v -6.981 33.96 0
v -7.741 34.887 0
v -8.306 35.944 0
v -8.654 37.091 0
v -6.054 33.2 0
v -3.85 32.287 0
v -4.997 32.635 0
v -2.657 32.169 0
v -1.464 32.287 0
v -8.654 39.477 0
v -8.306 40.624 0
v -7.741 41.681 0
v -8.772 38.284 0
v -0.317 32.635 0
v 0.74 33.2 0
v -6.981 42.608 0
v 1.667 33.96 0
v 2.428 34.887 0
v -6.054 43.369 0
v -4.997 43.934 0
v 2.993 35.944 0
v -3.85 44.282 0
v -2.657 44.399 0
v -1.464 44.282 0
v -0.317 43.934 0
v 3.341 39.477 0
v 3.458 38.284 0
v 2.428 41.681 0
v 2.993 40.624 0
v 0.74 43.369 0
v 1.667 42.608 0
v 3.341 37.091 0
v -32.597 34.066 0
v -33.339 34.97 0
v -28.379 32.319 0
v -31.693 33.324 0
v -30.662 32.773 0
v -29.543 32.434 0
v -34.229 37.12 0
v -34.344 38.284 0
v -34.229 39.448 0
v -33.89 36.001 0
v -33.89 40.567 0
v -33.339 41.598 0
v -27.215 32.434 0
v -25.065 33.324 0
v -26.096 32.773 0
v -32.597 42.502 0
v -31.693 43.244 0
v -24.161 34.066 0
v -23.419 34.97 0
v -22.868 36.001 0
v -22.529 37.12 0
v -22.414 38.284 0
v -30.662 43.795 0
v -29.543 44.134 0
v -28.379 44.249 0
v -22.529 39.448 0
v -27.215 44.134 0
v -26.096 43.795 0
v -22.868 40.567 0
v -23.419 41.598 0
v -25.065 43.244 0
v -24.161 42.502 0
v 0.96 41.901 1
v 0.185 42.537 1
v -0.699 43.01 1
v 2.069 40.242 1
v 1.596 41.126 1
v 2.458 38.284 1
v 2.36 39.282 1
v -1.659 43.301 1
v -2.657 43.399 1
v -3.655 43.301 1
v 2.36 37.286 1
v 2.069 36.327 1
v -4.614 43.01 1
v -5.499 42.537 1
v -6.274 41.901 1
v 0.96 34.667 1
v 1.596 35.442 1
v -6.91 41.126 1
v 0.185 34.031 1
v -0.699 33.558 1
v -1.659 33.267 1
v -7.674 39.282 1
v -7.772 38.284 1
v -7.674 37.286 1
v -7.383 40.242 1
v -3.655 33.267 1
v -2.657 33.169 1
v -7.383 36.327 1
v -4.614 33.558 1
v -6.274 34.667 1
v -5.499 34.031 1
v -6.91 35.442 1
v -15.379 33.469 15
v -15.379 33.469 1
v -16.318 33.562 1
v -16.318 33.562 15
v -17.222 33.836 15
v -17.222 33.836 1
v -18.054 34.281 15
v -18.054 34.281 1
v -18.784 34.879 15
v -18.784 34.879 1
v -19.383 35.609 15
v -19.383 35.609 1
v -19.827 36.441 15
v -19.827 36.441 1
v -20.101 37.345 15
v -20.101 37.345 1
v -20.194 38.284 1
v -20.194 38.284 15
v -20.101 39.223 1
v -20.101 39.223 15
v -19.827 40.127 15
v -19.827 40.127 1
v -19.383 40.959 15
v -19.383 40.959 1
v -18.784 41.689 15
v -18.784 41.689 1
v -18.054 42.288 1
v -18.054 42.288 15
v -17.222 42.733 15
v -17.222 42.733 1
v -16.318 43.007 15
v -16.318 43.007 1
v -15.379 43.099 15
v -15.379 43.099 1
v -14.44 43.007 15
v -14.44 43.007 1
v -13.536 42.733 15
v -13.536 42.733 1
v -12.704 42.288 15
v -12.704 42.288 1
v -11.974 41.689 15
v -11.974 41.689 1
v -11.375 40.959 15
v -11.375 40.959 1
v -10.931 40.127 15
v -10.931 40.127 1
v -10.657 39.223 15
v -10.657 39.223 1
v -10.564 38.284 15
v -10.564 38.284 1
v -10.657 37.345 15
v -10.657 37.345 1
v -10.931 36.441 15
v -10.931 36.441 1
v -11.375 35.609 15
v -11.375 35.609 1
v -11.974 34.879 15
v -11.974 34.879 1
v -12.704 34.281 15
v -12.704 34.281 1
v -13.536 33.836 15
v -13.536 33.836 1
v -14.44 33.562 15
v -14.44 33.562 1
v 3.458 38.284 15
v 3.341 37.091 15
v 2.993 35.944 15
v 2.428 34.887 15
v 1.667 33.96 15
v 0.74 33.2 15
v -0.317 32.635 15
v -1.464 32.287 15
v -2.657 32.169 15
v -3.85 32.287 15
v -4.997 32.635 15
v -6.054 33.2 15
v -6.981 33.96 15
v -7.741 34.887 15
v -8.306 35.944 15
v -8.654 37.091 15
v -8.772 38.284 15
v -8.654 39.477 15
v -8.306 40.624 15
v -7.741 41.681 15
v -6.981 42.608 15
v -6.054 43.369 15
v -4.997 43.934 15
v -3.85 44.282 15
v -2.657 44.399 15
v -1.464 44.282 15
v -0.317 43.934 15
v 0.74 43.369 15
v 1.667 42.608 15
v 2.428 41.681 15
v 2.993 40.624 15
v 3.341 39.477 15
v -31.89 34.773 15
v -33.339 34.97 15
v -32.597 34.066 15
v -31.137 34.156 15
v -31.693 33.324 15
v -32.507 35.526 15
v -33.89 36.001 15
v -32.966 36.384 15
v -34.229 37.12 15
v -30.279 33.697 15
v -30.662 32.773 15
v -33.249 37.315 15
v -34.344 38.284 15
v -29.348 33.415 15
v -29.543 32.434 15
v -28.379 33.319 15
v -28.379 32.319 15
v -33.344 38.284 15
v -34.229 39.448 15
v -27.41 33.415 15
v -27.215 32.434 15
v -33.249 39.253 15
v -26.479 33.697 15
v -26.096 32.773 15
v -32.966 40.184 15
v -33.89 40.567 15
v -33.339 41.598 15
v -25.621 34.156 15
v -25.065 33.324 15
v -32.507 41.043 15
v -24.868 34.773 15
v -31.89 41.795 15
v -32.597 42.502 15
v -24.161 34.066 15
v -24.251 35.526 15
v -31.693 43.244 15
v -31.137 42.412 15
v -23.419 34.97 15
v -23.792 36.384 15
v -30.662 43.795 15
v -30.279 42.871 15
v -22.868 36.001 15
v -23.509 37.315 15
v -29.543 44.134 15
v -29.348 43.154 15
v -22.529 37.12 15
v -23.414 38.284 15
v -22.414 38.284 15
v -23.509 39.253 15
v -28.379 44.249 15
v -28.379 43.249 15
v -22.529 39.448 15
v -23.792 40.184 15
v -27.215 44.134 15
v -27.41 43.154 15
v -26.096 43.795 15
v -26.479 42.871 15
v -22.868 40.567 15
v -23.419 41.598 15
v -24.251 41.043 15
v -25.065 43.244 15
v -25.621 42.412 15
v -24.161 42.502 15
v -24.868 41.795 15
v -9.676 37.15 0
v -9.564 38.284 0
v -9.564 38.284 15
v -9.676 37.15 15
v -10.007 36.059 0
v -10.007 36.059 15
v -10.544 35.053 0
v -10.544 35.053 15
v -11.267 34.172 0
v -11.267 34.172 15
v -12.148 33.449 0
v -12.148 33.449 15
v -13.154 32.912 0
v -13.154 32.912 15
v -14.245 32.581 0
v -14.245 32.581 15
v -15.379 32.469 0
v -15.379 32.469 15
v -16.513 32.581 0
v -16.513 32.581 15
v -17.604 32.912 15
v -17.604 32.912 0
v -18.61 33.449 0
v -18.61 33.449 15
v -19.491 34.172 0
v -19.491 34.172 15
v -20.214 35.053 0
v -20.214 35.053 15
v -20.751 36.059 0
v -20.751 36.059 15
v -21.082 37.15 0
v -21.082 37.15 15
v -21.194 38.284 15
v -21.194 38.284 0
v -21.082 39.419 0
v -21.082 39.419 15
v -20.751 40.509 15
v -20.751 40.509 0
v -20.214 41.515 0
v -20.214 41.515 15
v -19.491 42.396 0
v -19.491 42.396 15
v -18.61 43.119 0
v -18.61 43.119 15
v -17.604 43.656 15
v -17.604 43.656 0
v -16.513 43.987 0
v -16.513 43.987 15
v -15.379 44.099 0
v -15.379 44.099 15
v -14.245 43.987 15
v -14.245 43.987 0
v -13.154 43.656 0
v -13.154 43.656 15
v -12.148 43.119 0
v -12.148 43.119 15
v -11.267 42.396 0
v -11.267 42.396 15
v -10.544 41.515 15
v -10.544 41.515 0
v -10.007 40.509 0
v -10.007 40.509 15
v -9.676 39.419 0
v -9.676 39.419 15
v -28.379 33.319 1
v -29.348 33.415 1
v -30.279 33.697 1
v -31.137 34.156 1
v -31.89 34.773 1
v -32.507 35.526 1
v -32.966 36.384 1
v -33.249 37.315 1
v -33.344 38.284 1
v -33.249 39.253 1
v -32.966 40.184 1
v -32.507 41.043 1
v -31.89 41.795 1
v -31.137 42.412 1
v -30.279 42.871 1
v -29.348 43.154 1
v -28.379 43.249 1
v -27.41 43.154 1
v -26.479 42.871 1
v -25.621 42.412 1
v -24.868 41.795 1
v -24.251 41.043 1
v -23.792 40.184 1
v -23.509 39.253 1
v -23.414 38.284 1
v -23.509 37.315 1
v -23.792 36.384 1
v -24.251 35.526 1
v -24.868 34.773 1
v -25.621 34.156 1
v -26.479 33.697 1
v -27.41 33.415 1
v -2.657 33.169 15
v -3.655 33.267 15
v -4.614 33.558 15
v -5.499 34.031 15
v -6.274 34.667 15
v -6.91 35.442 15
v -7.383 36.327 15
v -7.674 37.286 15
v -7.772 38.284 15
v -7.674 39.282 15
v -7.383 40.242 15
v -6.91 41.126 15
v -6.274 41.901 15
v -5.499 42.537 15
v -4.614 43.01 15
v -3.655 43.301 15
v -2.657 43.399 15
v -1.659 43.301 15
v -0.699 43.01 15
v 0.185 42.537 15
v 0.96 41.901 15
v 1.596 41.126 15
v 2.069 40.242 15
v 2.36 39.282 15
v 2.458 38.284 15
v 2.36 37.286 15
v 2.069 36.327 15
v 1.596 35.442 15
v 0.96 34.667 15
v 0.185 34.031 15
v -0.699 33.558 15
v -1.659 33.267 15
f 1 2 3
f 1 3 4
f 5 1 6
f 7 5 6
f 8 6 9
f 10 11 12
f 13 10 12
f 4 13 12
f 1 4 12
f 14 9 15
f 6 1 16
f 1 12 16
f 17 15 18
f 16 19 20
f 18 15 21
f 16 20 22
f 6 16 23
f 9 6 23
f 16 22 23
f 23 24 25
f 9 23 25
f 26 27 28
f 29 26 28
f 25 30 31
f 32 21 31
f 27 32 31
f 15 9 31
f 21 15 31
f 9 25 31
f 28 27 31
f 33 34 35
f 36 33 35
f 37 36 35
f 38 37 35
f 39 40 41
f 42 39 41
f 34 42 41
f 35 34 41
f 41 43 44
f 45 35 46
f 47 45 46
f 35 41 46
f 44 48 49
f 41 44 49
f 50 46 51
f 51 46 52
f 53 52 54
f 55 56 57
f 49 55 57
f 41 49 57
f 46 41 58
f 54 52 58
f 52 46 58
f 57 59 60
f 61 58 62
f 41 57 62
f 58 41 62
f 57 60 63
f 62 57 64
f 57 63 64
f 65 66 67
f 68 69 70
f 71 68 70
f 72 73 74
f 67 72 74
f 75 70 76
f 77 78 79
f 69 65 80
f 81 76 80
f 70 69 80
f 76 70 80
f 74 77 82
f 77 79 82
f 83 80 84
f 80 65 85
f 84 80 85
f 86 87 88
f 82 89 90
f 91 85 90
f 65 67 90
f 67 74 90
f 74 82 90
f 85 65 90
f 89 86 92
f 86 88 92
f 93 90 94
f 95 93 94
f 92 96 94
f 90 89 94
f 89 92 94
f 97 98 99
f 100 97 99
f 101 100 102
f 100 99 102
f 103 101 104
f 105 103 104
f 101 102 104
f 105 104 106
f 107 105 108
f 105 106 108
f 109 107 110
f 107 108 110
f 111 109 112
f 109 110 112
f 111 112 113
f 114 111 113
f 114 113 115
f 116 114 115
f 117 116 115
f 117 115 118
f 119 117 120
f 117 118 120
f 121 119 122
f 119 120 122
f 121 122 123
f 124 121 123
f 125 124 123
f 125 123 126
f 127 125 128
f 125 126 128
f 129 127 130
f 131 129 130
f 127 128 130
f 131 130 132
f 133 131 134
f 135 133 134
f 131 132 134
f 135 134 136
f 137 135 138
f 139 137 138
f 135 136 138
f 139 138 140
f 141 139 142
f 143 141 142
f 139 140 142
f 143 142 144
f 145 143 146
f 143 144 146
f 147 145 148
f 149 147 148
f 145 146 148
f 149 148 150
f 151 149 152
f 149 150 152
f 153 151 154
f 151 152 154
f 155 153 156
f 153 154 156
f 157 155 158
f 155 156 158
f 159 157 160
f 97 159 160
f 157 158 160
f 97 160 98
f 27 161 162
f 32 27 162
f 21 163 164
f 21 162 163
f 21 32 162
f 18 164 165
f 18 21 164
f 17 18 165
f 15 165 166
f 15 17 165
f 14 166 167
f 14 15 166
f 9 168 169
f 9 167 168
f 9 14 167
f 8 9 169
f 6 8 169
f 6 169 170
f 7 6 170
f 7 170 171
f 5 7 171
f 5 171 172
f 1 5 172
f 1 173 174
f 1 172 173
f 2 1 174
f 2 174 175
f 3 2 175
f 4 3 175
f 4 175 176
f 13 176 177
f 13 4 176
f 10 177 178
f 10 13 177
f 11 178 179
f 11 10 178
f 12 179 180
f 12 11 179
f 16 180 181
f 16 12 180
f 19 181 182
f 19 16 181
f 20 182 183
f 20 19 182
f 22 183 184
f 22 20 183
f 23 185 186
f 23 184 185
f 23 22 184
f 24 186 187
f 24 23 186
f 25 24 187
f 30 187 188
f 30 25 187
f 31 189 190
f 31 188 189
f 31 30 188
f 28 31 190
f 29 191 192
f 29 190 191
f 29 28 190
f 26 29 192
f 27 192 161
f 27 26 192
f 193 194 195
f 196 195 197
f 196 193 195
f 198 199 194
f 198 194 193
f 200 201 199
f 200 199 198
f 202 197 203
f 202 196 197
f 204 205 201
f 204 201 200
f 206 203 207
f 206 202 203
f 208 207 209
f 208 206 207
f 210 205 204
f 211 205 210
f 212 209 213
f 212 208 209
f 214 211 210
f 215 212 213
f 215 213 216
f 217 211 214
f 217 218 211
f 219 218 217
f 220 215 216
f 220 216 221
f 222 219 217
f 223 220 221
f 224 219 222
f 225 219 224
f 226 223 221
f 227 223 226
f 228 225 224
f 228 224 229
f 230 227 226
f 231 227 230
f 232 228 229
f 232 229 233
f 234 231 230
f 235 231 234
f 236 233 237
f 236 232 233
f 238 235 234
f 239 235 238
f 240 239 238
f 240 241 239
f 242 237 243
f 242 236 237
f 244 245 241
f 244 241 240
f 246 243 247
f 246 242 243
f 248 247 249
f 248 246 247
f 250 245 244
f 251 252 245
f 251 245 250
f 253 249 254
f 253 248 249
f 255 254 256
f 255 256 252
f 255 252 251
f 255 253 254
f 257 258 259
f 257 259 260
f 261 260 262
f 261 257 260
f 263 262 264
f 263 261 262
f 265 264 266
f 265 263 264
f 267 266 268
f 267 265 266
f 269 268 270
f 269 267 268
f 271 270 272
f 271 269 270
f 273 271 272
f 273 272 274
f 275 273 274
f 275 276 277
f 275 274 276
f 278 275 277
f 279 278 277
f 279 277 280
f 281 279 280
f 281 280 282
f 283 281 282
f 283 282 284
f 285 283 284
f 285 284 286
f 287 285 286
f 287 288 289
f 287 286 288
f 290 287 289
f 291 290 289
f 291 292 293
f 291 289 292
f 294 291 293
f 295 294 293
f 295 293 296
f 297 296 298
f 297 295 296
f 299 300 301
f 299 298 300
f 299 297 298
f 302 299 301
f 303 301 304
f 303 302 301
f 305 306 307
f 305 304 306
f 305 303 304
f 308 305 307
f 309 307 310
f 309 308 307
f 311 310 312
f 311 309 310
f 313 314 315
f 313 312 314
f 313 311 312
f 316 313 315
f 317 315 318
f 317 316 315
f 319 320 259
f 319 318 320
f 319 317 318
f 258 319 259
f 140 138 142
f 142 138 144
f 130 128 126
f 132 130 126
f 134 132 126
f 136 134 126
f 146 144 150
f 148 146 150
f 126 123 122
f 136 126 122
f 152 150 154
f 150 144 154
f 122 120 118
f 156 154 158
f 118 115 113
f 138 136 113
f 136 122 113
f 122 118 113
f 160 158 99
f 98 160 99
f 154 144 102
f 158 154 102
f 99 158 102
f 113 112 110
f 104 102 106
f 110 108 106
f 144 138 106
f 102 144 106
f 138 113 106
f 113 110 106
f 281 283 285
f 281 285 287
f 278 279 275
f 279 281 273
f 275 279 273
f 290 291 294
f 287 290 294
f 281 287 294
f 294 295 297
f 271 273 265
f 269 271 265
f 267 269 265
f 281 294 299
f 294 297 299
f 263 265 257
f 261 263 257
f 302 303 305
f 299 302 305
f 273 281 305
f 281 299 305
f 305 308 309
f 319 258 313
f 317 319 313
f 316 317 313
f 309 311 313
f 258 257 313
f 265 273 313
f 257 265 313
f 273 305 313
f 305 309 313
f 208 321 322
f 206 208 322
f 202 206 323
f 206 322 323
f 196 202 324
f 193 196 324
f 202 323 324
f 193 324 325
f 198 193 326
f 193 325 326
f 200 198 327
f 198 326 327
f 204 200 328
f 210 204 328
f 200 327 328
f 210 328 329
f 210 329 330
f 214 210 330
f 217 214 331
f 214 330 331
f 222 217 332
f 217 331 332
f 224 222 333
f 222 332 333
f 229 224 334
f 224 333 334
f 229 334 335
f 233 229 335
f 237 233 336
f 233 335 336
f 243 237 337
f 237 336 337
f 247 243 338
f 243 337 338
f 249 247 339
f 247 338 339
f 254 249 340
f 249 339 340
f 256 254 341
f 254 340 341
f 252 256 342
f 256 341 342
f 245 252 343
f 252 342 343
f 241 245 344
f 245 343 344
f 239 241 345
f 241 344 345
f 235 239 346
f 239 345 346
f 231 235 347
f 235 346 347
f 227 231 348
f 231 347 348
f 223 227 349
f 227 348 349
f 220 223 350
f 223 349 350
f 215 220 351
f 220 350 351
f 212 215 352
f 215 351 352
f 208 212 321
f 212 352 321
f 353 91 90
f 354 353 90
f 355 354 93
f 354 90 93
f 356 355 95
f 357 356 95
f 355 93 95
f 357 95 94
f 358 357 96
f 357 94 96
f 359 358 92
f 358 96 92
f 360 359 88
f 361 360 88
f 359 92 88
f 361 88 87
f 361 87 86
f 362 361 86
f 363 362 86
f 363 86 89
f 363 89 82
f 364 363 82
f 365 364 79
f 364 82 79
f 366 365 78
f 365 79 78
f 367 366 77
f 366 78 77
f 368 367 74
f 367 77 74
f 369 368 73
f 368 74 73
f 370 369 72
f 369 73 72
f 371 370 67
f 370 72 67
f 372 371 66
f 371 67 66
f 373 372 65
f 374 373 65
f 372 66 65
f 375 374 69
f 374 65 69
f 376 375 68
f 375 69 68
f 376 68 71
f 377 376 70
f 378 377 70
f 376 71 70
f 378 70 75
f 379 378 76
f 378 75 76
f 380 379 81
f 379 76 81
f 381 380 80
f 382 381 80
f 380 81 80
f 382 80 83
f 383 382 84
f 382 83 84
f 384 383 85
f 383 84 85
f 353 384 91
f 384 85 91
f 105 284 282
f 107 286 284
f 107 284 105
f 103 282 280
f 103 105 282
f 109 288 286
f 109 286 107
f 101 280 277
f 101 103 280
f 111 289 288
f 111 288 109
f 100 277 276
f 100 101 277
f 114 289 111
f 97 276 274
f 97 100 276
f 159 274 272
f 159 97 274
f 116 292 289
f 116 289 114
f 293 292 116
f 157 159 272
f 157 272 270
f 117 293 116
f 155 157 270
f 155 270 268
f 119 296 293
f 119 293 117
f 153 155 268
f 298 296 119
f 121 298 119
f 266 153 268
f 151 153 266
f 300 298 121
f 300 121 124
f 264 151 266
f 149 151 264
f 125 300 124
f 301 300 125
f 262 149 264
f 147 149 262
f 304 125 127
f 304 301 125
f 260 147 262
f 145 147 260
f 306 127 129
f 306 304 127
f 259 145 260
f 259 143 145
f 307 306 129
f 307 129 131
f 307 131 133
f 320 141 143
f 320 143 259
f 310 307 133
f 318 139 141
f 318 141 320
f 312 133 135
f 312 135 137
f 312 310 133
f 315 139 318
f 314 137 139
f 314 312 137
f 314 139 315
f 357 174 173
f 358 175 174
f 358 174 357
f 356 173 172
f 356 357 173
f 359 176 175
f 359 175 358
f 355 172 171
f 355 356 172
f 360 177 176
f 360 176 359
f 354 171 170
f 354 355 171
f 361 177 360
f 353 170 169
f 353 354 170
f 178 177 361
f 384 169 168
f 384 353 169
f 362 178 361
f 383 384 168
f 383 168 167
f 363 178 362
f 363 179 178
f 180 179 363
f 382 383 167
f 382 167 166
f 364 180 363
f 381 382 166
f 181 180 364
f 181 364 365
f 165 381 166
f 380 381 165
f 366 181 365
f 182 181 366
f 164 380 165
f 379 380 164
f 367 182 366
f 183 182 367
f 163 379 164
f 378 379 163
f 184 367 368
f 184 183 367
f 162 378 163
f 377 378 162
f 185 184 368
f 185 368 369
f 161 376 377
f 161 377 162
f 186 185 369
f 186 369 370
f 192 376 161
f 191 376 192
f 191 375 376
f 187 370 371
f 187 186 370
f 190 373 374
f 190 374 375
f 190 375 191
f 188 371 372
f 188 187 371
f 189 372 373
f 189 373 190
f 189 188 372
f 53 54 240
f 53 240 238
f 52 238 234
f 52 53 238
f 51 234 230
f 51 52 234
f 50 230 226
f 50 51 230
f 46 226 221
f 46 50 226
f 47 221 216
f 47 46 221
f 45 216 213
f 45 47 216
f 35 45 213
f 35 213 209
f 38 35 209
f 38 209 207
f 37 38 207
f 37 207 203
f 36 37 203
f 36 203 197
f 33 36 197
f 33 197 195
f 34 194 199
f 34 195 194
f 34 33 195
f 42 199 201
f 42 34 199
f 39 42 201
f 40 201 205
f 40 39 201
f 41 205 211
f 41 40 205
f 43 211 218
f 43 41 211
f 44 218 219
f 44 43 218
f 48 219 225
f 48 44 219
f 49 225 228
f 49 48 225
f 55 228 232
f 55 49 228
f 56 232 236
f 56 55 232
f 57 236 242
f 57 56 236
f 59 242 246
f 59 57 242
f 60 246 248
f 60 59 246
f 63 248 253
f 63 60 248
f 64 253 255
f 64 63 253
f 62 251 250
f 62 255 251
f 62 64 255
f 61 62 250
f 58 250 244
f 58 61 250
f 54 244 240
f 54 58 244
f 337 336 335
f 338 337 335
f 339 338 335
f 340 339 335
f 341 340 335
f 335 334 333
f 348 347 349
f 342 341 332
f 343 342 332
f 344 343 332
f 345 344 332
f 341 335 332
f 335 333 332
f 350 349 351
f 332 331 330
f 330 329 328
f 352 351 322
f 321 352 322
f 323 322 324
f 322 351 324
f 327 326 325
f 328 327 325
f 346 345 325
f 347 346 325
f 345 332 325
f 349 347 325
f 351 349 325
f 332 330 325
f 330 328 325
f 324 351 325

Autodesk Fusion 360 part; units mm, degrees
sketch "Sketch1" plane through (0, 0, 0) normal (0, 0, 1) x (1, 0, 0)
  circle A0 centre (-28.379, 38.2841) radius 5.965
  circle A1 centre (-2.6569, 38.2841) radius 6.115
  circle A2 centre (-15.379, 38.2841) radius 5.815
  dimension "d1" = 11.63
  dimension "d2" = 11.93
  dimension "d3" = 12.23
extrude "Extrude1" add sketch "Sketch1" along normal blind 15 makes body 1 at (-9.5929, 37.7051, 10) makes body 2 at (-22.4436, 37.6902, 10) makes body 3 at (3.4277, 37.6752, 10)
hole "Hole1" at (-15.379, 38.2841, 15) direction (0, 0, -1) diameter 9.63 depth 14 tip angle 180 bodies 1
hole "Hole2" at (-28.379, 38.2841, 15) direction (0, 0, -1) diameter 9.93 depth 14 tip angle 180 bodies 2
hole "Hole3" at (-2.6569, 38.2841, 15) direction (0, 0, -1) diameter 10.23 depth 14 tip angle 180 bodies 3
